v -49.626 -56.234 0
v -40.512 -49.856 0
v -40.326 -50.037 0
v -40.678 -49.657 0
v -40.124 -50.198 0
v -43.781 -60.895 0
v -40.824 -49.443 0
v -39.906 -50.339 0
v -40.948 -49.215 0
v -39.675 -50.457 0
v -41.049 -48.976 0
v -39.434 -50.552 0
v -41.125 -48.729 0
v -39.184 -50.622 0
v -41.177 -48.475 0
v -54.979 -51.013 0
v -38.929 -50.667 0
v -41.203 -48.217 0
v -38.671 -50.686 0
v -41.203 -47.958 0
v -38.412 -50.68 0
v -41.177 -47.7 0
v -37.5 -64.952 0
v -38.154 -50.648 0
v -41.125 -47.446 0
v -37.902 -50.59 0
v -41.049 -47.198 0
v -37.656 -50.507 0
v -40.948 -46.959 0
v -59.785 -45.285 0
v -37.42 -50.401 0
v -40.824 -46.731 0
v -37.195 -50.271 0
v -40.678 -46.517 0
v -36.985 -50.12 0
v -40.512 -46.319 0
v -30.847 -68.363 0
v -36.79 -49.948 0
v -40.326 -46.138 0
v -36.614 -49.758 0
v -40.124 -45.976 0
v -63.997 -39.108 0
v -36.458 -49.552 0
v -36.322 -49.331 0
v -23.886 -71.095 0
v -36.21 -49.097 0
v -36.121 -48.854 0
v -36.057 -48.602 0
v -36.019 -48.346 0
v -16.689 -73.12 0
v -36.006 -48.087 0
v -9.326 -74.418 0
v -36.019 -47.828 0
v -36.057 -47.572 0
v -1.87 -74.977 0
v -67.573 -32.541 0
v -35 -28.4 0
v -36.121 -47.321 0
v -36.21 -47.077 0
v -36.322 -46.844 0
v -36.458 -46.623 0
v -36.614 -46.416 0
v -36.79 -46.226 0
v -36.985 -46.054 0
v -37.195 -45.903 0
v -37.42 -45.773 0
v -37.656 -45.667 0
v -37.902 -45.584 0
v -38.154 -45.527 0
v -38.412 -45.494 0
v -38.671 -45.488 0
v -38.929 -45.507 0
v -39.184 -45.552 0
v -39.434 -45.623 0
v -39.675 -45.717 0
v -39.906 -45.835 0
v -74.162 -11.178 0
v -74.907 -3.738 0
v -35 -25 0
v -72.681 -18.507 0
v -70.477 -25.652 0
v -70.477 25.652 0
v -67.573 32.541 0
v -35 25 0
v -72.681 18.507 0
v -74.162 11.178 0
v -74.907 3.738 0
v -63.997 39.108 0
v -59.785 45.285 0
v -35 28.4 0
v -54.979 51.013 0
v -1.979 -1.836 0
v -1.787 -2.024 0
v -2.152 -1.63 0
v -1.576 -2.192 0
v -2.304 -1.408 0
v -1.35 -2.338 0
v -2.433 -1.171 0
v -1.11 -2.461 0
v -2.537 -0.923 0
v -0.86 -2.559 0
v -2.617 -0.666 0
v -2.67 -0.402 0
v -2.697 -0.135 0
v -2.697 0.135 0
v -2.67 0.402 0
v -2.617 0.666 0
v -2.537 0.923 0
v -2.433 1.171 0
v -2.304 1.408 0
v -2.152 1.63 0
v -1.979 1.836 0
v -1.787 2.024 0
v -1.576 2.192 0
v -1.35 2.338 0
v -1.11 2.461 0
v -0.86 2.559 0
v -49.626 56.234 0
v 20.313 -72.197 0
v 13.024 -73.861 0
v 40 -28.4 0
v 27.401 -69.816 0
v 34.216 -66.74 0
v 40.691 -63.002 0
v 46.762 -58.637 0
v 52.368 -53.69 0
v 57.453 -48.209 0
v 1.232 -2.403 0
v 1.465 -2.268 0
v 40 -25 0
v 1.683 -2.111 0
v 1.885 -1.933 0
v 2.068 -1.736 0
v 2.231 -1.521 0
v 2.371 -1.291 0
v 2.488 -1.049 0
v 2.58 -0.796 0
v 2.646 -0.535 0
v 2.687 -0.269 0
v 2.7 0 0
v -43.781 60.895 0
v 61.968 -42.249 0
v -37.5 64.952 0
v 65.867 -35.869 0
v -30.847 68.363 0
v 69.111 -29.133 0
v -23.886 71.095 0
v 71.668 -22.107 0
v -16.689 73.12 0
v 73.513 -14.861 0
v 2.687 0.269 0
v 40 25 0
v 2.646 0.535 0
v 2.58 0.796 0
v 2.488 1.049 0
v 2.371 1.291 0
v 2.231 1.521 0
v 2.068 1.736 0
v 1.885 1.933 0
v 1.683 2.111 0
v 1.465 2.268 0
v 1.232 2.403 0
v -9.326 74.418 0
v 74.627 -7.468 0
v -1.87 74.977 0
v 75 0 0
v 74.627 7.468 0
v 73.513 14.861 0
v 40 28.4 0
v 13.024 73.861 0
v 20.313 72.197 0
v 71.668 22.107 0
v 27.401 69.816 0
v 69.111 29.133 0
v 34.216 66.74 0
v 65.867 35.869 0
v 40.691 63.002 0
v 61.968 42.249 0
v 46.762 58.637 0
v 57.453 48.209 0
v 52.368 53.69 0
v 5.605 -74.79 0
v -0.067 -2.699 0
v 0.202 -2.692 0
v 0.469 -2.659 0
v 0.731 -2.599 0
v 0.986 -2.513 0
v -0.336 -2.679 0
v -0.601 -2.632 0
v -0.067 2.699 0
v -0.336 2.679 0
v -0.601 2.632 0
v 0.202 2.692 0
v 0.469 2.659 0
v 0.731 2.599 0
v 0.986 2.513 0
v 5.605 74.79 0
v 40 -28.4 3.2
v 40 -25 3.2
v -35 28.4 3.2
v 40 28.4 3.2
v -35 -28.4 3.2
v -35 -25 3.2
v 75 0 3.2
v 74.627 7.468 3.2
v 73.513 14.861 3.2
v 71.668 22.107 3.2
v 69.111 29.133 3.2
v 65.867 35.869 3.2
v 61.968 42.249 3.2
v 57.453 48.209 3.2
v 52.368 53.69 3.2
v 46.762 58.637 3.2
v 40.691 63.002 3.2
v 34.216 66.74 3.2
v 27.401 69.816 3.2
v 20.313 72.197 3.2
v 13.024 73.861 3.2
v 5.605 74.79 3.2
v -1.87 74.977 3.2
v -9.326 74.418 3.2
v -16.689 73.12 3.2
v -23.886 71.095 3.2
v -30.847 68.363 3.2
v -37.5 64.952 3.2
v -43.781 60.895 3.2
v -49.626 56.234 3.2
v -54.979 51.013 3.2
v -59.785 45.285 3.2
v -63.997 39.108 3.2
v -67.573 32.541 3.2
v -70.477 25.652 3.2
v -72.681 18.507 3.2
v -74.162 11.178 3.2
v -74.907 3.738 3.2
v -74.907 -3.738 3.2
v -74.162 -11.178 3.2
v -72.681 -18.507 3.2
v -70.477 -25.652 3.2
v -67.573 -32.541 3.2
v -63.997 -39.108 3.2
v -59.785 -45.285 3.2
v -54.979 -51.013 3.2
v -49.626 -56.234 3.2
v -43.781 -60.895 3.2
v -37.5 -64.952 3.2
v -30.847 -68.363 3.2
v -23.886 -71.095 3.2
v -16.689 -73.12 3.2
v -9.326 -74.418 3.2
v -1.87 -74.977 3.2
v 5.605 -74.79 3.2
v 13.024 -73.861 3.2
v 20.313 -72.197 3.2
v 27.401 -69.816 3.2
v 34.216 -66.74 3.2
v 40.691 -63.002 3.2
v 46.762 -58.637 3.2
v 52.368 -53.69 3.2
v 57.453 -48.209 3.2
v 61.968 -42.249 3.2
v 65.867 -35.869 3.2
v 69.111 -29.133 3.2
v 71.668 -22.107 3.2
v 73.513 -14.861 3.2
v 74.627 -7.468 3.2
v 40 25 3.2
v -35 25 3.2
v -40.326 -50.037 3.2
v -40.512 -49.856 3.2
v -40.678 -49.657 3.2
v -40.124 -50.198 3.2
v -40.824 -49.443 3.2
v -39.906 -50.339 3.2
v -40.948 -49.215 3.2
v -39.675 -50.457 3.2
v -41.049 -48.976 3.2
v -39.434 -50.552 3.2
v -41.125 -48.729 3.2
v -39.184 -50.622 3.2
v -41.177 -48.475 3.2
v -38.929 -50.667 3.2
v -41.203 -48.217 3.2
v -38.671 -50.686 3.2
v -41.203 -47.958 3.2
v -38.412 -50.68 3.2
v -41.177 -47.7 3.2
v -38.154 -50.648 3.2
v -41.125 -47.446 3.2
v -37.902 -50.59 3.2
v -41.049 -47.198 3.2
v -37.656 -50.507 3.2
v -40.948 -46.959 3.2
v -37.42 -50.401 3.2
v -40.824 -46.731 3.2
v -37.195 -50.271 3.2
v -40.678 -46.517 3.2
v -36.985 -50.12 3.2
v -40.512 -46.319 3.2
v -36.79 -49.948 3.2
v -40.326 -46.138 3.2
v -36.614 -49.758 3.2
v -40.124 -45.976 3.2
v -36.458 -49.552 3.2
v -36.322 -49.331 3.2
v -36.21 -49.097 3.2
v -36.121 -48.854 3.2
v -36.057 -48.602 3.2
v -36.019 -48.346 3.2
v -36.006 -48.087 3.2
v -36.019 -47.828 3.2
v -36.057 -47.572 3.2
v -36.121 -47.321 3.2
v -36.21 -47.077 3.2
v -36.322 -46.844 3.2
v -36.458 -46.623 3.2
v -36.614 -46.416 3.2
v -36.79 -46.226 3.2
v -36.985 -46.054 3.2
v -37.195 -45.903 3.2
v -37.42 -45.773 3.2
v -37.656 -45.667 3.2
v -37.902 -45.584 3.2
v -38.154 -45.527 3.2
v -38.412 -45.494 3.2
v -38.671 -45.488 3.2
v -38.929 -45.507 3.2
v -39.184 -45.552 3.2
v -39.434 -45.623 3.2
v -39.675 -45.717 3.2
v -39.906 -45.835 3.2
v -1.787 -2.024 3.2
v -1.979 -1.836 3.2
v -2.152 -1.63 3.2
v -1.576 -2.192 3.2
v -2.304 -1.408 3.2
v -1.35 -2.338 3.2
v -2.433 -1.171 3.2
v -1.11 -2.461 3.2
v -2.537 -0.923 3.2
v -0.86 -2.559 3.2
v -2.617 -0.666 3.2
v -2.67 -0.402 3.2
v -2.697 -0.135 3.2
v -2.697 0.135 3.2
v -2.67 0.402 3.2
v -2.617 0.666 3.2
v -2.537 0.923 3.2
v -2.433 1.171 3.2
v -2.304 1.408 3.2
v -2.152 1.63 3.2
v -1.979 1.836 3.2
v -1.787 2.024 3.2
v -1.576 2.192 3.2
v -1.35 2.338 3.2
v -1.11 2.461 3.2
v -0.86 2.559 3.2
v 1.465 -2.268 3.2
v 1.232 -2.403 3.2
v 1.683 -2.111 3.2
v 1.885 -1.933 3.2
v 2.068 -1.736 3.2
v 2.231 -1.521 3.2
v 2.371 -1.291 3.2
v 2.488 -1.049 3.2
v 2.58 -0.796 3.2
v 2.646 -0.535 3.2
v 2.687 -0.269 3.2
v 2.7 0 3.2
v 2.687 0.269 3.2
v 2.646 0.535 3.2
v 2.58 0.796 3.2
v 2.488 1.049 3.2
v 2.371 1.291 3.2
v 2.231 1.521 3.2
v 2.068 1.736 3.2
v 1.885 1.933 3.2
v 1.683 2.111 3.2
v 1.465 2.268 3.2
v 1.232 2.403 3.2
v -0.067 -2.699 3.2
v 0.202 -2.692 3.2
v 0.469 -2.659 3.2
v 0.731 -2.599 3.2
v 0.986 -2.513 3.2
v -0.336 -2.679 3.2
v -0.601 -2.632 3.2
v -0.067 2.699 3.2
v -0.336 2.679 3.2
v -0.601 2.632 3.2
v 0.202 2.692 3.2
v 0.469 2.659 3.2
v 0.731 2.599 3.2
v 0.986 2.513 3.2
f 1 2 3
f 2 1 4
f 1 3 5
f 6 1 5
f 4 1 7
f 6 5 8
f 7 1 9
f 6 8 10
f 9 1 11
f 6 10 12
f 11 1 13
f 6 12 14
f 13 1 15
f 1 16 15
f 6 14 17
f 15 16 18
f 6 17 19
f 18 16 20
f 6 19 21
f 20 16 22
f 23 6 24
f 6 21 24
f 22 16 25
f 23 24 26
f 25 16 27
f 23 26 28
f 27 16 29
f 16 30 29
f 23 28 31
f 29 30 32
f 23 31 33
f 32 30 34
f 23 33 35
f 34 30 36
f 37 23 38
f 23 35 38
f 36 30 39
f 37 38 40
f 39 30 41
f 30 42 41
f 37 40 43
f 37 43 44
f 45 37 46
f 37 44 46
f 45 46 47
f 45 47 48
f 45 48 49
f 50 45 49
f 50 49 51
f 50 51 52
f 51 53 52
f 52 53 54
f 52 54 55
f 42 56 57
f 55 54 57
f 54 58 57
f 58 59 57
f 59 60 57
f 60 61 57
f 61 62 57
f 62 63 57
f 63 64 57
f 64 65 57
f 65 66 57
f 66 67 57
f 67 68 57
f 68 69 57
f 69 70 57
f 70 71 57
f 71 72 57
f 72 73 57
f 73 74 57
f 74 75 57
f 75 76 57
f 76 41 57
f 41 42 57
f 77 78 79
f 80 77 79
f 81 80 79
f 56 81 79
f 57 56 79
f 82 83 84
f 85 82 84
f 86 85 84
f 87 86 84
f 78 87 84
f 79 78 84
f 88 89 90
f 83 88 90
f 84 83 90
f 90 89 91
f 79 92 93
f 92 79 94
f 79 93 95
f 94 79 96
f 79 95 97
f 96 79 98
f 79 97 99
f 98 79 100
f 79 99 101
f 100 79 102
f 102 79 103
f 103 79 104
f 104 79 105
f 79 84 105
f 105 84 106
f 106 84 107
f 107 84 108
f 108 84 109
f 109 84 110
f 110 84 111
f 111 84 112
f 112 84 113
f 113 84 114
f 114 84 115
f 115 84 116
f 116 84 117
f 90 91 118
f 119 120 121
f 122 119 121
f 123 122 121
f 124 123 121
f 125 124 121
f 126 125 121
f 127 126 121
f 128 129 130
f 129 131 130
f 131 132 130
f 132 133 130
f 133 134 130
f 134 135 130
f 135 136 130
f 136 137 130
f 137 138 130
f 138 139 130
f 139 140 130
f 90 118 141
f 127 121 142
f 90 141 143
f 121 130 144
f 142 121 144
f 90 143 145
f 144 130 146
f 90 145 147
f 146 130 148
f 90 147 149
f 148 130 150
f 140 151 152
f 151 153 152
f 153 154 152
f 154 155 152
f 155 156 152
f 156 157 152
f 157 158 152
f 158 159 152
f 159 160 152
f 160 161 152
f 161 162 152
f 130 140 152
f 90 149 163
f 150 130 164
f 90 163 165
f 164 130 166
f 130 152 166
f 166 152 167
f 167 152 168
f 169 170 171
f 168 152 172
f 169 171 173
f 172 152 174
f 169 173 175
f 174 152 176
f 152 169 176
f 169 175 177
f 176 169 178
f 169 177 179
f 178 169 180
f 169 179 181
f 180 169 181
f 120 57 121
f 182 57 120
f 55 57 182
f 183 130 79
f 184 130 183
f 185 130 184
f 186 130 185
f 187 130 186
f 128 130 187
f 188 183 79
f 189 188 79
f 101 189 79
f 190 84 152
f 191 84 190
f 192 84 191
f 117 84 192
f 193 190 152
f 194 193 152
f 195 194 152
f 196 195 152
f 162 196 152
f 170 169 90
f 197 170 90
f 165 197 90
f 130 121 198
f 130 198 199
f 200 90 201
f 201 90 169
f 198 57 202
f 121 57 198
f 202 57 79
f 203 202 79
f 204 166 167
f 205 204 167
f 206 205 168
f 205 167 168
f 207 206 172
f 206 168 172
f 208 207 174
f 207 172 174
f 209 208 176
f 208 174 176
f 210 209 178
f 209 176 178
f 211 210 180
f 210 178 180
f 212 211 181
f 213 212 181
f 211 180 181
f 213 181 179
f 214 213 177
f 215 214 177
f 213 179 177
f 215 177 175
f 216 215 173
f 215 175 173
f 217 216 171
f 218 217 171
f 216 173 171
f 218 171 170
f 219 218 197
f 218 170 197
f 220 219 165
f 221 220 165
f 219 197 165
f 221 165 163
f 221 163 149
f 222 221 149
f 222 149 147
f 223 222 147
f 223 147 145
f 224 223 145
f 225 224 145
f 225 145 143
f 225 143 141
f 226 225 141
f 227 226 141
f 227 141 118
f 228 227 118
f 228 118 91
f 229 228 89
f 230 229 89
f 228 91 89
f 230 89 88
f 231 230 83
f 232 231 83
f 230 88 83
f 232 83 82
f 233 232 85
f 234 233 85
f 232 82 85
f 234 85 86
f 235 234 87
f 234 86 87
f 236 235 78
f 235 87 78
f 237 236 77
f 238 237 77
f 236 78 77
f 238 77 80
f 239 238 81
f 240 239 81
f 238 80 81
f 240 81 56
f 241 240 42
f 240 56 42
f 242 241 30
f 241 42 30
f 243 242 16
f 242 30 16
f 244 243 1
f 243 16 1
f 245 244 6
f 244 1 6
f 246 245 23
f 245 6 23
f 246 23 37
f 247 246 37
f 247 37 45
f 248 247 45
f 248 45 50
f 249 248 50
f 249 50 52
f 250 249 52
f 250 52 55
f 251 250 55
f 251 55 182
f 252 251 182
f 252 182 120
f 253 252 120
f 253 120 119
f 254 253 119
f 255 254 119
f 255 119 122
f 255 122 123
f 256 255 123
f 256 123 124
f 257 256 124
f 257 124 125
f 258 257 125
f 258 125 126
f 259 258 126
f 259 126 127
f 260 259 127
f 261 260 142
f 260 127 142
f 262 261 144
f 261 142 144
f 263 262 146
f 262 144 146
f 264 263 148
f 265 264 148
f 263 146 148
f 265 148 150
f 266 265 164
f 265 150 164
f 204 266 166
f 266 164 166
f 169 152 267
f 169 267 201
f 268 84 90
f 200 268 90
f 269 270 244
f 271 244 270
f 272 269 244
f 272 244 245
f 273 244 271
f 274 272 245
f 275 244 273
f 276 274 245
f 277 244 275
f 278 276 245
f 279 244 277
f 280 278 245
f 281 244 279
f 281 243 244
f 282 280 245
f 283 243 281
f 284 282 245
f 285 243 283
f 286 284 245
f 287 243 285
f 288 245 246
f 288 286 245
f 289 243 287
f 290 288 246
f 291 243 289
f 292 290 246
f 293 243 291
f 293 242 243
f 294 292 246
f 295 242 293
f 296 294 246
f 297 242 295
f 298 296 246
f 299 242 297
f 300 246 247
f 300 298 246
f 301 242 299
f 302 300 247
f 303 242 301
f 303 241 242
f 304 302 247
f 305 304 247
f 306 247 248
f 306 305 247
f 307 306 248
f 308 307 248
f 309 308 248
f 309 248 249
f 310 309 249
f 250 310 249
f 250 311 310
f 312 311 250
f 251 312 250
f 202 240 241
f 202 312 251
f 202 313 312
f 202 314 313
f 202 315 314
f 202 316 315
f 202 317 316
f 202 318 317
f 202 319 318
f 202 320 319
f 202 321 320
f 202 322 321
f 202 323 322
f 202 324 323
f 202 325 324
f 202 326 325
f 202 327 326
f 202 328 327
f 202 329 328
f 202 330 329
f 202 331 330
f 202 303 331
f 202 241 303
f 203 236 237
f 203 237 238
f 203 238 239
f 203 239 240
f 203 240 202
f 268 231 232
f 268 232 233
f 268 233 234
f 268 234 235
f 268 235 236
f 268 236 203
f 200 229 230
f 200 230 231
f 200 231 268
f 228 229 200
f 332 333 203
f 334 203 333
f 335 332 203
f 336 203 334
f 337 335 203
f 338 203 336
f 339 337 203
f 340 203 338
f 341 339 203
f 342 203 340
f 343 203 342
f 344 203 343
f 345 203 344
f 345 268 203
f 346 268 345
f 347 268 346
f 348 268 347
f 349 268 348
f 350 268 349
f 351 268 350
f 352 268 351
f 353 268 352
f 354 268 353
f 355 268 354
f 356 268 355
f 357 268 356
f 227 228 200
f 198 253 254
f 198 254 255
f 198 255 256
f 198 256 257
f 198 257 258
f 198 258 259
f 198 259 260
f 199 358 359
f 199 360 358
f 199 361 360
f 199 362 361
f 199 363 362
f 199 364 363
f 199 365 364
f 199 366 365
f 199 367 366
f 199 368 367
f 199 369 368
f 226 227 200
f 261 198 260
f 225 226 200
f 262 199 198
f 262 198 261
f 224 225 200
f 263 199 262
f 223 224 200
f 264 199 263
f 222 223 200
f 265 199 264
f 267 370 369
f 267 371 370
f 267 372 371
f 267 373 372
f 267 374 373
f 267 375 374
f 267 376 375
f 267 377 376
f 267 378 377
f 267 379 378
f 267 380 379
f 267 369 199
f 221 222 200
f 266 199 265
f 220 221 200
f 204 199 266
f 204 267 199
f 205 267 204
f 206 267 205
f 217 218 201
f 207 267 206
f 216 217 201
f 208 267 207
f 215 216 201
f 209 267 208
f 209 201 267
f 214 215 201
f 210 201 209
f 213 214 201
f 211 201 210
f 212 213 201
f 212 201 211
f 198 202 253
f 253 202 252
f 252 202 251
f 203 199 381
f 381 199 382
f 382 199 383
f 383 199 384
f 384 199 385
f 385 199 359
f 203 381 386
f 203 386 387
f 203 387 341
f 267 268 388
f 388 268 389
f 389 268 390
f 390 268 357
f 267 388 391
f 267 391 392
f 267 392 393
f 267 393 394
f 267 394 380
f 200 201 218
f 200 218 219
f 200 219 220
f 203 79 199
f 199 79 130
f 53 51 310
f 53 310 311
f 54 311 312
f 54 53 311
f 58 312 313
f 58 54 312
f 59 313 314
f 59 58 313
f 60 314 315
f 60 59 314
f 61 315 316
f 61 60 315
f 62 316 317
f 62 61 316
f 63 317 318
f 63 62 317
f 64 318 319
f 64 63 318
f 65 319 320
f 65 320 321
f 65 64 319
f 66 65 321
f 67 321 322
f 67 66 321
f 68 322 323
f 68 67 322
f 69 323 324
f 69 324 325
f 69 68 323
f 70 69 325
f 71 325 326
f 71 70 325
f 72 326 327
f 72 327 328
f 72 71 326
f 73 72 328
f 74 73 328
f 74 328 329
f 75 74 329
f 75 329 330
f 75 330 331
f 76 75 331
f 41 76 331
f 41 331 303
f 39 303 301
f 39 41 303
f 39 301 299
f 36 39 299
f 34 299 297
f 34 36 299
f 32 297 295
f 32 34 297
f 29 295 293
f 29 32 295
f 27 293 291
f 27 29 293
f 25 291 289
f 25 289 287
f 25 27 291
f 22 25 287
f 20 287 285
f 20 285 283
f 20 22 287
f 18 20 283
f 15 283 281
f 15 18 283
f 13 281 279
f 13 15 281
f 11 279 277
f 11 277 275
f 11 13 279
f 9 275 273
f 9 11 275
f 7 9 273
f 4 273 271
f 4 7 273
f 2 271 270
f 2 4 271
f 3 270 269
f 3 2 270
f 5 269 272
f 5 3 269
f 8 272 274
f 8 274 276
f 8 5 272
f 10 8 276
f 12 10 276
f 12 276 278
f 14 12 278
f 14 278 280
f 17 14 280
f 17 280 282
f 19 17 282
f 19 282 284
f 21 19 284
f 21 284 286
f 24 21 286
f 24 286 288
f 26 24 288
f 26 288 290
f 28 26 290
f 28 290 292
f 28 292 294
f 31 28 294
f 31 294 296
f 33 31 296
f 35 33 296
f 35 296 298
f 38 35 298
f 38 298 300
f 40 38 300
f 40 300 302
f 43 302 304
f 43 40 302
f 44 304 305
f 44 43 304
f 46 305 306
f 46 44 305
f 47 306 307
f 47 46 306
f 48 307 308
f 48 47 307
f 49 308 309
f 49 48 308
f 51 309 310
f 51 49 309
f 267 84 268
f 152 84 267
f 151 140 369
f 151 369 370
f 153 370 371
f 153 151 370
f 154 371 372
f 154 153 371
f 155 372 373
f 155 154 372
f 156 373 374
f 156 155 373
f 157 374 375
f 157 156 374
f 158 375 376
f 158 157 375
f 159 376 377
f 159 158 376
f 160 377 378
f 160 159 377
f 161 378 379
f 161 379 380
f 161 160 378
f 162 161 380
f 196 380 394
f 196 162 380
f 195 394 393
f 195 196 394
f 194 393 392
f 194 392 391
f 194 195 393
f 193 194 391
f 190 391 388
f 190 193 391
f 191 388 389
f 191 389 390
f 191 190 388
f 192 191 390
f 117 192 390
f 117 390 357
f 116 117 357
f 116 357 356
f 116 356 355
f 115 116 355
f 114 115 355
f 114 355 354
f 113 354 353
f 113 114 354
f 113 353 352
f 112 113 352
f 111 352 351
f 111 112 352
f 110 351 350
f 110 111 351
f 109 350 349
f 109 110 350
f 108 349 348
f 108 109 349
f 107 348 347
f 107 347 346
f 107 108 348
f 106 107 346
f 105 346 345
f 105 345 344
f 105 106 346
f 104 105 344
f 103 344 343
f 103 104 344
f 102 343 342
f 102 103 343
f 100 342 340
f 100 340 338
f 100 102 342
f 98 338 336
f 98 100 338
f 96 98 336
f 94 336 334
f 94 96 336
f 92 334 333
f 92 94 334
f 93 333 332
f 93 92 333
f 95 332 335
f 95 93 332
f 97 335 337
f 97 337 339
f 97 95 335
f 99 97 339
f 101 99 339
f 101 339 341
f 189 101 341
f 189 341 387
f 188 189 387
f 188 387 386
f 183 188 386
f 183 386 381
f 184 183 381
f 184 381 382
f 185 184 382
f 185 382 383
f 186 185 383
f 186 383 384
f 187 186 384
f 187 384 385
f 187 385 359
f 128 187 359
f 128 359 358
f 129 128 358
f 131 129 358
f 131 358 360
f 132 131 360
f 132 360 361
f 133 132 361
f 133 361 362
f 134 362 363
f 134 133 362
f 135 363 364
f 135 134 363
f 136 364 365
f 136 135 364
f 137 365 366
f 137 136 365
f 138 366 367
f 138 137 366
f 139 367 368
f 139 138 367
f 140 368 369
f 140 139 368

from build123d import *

# Parameters (mm, degrees)
F0_R     = 75
F0_R_2   = 2.6
F0_W     = 75
F0_H     = 3.4
F0_R_3   = 2.7
F1_DEPTH = 3.2


with BuildPart() as f1:
    # F0 (on Top) → F1 (new body)
    with BuildSketch(Plane.XY):
        Circle(F0_R)
        with Locations((-38.605813, -48.087154)):
            Circle(F0_R_2, mode=Mode.SUBTRACT)
        with Locations((2.5, -26.7)):
            Rectangle(F0_W, F0_H, mode=Mode.SUBTRACT)
        Circle(F0_R_3, mode=Mode.SUBTRACT)
        with Locations((2.5, 26.7)):
            Rectangle(F0_W, F0_H, mode=Mode.SUBTRACT)
    extrude(amount=F1_DEPTH)


solid = f1.part
